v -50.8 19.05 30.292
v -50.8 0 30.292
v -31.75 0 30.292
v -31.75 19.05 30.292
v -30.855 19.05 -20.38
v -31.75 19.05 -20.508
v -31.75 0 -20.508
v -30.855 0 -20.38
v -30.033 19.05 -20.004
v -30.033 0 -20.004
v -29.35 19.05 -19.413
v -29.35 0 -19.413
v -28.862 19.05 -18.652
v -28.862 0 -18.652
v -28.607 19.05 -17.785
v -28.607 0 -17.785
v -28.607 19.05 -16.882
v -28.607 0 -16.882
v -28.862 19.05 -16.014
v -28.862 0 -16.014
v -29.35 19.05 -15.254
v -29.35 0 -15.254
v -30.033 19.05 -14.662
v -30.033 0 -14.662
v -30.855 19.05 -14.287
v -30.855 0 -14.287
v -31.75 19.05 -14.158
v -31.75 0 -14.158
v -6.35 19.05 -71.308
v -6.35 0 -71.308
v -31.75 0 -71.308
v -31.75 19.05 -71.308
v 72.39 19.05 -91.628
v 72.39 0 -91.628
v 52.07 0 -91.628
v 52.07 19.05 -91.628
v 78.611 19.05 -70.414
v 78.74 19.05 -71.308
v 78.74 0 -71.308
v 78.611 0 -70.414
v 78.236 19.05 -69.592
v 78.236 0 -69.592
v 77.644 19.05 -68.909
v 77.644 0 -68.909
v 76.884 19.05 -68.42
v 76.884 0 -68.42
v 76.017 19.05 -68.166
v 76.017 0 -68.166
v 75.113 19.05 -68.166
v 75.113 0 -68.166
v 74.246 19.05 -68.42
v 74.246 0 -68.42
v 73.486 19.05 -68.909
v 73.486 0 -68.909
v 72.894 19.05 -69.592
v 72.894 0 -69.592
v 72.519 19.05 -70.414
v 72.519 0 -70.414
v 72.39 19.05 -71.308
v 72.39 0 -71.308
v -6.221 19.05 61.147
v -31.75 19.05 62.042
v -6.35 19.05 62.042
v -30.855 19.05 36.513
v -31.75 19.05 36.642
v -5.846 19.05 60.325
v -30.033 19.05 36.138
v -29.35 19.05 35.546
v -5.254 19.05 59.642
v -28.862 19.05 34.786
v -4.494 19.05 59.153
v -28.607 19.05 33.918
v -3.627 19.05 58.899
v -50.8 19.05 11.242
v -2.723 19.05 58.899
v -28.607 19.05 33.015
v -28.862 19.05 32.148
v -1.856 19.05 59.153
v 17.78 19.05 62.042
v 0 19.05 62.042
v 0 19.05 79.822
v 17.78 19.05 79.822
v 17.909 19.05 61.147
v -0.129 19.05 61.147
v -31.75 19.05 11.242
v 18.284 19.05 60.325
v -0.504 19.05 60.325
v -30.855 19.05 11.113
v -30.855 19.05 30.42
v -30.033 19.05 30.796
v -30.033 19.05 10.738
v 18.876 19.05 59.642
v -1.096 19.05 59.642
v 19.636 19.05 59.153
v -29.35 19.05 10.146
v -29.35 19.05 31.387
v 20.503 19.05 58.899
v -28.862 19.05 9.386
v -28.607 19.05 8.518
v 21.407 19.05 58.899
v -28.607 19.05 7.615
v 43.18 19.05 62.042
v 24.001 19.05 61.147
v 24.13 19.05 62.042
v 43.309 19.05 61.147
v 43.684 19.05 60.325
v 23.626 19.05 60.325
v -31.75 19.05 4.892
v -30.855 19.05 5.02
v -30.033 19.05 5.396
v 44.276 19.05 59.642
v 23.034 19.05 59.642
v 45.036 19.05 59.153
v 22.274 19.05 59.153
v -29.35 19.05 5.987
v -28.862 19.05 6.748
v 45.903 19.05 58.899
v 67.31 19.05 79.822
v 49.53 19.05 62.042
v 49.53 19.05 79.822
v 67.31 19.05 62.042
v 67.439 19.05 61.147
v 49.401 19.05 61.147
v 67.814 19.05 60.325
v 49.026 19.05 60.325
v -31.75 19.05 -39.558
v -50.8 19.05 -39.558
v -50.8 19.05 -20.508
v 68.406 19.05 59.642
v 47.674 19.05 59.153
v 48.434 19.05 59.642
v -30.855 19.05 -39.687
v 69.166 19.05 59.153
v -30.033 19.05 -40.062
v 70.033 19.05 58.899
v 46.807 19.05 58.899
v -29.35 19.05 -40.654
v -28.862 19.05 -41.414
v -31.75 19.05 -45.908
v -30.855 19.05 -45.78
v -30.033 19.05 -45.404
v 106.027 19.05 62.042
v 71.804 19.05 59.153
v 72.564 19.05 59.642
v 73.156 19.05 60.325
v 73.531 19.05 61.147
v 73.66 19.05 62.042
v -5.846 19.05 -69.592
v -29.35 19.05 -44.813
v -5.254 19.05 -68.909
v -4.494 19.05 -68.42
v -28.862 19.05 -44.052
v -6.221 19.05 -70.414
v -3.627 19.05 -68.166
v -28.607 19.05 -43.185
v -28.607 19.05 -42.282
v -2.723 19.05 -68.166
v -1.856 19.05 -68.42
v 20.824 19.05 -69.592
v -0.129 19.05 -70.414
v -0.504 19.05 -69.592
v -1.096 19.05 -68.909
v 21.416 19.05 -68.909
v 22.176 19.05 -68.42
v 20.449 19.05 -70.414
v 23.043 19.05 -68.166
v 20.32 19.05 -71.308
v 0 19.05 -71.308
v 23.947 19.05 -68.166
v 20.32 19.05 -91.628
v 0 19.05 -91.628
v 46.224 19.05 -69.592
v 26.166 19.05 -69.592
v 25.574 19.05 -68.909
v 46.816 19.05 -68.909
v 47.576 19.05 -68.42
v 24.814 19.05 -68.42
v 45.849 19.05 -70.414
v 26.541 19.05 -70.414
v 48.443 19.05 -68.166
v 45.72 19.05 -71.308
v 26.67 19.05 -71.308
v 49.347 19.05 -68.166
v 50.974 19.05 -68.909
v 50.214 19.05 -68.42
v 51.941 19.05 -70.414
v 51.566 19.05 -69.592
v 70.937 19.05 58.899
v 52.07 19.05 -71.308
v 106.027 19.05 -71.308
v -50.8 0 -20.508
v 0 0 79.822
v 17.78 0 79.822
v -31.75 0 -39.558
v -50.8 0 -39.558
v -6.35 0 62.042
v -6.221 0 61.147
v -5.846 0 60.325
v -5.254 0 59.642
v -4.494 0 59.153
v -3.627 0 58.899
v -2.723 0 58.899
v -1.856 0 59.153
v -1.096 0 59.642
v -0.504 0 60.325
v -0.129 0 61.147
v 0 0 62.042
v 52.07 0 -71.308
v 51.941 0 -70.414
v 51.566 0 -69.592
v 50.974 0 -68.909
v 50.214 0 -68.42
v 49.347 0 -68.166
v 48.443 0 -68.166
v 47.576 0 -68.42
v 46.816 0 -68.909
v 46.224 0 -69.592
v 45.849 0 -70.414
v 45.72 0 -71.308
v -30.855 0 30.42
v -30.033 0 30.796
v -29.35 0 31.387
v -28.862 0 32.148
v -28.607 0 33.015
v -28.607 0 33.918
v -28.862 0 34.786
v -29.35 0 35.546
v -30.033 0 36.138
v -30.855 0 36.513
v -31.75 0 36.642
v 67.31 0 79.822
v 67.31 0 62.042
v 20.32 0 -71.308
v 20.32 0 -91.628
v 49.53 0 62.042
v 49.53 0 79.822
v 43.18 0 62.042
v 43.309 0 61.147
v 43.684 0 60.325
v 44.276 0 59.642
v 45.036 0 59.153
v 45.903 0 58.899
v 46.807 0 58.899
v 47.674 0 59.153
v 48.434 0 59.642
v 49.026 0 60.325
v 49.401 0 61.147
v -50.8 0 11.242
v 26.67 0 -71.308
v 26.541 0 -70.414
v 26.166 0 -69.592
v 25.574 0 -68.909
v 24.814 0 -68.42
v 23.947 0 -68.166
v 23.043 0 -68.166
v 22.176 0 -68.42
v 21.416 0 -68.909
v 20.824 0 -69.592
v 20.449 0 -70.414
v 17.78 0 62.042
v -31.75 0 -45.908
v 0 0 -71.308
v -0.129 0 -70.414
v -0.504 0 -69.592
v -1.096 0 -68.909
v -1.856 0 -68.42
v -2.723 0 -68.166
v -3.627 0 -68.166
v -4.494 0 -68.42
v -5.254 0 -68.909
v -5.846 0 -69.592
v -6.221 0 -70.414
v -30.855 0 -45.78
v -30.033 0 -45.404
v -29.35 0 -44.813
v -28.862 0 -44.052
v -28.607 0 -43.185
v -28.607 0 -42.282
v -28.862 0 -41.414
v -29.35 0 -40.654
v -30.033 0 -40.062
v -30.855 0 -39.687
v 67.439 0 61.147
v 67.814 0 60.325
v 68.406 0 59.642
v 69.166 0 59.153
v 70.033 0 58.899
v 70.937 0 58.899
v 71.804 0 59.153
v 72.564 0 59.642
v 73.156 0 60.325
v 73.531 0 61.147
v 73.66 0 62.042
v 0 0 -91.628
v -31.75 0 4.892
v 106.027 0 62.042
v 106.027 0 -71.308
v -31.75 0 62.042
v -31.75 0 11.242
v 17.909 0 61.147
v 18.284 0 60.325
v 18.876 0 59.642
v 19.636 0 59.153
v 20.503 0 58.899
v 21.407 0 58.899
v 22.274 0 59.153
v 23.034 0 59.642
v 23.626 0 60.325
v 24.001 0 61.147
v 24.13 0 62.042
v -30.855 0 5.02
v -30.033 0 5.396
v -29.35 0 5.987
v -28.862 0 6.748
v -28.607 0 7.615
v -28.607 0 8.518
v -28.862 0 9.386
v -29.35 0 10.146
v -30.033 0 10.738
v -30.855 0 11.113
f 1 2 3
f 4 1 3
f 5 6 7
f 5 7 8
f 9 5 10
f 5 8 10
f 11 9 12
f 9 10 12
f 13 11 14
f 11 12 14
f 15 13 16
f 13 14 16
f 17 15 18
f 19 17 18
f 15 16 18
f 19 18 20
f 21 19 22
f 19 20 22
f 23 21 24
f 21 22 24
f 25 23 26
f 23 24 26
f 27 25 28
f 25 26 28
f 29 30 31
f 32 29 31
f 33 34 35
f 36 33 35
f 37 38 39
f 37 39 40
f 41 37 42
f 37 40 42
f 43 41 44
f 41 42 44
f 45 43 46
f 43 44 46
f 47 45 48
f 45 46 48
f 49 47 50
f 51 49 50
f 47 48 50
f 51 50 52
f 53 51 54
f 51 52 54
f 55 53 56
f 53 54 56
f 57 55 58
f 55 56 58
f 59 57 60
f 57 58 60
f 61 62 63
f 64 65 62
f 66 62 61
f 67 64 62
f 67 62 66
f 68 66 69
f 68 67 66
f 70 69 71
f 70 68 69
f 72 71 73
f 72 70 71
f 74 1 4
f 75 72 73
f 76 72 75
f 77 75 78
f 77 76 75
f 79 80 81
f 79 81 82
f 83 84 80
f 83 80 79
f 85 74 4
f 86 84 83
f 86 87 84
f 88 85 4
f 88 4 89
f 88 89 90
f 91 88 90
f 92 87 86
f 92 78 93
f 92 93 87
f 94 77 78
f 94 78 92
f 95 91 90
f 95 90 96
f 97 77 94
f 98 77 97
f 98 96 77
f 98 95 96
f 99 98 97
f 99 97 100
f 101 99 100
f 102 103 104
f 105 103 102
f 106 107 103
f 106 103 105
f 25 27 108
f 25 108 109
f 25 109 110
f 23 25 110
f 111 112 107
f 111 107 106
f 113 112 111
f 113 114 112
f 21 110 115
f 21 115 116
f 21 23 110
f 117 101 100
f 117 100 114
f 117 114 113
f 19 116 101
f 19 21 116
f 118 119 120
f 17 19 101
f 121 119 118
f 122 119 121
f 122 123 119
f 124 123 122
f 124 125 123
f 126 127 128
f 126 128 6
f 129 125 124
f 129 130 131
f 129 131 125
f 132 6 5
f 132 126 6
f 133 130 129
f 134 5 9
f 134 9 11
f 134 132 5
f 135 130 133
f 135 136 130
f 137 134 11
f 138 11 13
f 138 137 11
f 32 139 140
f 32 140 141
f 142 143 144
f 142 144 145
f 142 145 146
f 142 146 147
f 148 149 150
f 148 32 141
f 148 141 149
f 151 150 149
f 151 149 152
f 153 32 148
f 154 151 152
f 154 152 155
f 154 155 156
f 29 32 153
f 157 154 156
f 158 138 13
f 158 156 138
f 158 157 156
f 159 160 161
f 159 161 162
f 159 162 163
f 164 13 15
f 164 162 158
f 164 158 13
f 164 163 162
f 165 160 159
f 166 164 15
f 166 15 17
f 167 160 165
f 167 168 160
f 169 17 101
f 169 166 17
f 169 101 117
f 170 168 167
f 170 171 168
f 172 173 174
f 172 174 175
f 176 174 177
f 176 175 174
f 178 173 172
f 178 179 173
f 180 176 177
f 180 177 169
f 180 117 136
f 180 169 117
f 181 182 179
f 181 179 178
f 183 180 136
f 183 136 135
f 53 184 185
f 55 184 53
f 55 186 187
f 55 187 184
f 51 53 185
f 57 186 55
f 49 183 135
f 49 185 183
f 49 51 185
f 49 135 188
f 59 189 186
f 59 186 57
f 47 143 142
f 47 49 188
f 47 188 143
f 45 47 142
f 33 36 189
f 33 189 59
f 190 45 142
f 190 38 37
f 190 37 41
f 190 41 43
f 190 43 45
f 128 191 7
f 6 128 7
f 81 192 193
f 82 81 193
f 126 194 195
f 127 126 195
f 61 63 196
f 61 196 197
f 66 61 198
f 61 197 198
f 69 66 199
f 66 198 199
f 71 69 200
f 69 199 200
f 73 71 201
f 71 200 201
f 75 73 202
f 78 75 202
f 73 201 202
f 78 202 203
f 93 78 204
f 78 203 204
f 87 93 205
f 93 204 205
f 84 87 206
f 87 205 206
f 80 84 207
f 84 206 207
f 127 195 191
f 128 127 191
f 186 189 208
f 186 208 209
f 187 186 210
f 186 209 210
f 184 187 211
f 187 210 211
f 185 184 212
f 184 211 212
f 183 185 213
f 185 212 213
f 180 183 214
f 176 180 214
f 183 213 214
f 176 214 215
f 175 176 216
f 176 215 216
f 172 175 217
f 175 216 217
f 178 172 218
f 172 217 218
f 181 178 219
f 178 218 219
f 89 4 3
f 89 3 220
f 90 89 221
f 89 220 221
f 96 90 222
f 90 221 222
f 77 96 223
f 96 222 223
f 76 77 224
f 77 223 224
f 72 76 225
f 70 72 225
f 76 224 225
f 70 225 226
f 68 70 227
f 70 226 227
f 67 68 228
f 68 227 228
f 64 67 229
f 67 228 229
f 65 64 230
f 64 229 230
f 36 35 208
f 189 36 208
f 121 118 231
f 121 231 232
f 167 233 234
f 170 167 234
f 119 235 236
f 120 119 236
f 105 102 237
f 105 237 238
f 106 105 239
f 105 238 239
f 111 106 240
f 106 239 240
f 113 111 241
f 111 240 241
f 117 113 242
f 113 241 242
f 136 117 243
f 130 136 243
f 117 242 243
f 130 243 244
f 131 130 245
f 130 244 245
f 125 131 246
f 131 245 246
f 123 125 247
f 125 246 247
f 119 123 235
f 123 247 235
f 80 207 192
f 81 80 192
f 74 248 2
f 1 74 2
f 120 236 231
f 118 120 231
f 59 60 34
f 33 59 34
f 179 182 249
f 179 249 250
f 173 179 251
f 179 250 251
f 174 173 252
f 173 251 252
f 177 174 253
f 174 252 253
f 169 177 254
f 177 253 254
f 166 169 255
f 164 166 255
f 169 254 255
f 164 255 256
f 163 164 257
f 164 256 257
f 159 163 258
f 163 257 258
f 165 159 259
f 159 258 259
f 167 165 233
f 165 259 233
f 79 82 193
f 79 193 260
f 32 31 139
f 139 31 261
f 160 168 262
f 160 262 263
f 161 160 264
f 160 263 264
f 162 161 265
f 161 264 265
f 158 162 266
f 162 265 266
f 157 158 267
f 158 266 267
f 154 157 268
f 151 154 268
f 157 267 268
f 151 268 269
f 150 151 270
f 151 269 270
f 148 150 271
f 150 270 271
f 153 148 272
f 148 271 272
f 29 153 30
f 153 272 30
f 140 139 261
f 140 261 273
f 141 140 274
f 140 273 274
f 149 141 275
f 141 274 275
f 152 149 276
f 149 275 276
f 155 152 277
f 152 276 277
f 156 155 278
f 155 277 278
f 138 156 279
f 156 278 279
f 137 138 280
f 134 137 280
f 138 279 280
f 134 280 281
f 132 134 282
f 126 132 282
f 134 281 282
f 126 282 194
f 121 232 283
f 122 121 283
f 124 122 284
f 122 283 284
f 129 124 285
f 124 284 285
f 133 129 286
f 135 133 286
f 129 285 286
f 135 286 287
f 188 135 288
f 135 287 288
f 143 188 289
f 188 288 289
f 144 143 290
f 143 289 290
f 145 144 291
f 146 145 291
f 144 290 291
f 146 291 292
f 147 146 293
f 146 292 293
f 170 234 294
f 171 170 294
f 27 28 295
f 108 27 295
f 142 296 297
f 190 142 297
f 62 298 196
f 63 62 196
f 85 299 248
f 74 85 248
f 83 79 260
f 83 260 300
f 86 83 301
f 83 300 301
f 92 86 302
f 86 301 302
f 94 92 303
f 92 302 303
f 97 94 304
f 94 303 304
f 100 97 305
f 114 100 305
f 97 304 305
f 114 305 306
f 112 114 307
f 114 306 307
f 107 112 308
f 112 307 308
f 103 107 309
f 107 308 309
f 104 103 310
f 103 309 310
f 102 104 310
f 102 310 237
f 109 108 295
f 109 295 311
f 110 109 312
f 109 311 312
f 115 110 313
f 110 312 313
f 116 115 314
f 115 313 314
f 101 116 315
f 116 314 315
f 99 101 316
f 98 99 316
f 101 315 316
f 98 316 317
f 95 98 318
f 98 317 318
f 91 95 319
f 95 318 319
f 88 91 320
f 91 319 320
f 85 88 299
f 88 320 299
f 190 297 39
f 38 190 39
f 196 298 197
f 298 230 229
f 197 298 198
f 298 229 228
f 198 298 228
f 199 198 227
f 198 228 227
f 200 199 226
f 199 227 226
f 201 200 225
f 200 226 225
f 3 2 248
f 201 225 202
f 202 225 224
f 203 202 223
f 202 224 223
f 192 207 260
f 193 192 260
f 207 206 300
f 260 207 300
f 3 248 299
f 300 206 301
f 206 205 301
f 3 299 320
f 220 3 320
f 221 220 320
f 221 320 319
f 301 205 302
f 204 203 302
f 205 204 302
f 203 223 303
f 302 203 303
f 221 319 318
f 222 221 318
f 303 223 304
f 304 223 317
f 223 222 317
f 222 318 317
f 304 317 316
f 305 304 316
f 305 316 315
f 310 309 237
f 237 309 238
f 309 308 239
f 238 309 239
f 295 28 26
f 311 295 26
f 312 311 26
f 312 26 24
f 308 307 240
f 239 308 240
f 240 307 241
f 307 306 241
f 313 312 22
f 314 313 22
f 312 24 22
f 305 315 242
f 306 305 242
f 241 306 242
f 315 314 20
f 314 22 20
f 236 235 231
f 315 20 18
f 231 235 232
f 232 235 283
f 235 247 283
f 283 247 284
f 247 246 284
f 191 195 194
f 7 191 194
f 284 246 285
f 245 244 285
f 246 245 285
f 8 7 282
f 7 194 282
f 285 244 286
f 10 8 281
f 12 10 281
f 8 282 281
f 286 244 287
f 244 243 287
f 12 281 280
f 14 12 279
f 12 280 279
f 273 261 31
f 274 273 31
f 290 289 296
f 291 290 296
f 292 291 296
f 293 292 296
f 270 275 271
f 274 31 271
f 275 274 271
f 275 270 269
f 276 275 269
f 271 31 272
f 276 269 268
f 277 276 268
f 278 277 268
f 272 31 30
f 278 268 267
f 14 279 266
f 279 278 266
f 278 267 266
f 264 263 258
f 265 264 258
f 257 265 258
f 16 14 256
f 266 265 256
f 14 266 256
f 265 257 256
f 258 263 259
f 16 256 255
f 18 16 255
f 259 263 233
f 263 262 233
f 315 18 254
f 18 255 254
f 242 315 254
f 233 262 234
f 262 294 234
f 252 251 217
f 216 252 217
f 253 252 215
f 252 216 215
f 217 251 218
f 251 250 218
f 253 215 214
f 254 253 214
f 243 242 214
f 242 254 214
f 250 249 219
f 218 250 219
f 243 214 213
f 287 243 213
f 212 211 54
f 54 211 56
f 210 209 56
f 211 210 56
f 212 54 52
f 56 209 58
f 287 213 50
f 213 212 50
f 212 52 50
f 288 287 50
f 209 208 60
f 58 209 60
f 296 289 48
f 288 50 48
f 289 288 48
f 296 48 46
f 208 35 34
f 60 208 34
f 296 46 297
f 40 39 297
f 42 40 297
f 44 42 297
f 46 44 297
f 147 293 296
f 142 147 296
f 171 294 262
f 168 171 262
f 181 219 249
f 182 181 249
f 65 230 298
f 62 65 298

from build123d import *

# Parameters (mm, degrees)
BOSS_EXTRUDE1_DEPTH = 19.05


with BuildPart() as part:
    # Sketch1 → Boss-Extrude1 (new body)
    with BuildSketch(Plane(origin=(0, 0, 0), x_dir=(1, 0, 0), z_dir=(0, 1, 0))):
        with BuildLine():
            Line((-31.75, 39.558423237), (-50.8, 39.558423237))
            Line((-50.8, 39.558423237), (-50.8, 20.508423237))
            Line((-50.8, 20.508423237), (-31.75, 20.508423237))
            ThreePointArc((-31.75, 20.508423237), (-28.575, 17.333423237), (-31.75, 14.158423237))
            Line((-31.75, 14.158423237), (-31.75, -4.891576763))
            ThreePointArc((-31.75, -4.891576763), (-28.575, -8.066576763), (-31.75, -11.241576763))
            Line((-31.75, -11.241576763), (-50.8, -11.241576763))
            Line((-50.8, -11.241576763), (-50.8, -30.291576763))
            Line((-50.8, -30.291576763), (-31.75, -30.291576763))
            ThreePointArc((-31.75, -30.291576763), (-28.575, -33.466576763), (-31.75, -36.641576763))
            Line((-31.75, -36.641576763), (-31.75, -62.041576763))
            Line((-31.75, -62.041576763), (-6.35, -62.041576763))
            ThreePointArc((-6.35, -62.041576763), (-3.175, -58.866576763), (0, -62.041576763))
            Line((0, -62.041576763), (0, -79.821576763))
            Line((0, -79.821576763), (17.78, -79.821576763))
            Line((17.78, -79.821576763), (17.78, -62.041576763))
            ThreePointArc((17.78, -62.041576763), (20.955, -58.866576763), (24.13, -62.041576763))
            Line((24.13, -62.041576763), (43.18, -62.041576763))
            ThreePointArc((43.18, -62.041576763), (46.355, -58.866576763), (49.53, -62.041576763))
            Line((49.53, -62.041576763), (49.53, -79.821576763))
            Line((49.53, -79.821576763), (67.31, -79.821576763))
            Line((67.31, -79.821576763), (67.31, -62.041576763))
            ThreePointArc((67.31, -62.041576763), (70.485, -58.866576763), (73.66, -62.041576763))
            Line((73.66, -62.041576763), (106.027076755, -62.041576763))
            Line((106.027076755, -62.041576763), (106.027076755, 71.308423237))
            Line((106.027076755, 71.308423237), (78.74, 71.308423237))
            ThreePointArc((78.74, 71.308423237), (75.565, 68.133423237), (72.39, 71.308423237))
            Line((72.39, 71.308423237), (72.39, 91.628423237))
            Line((72.39, 91.628423237), (52.07, 91.628423237))
            Line((52.07, 91.628423237), (52.07, 71.308423237))
            ThreePointArc((52.07, 71.308423237), (48.895, 68.133423237), (45.72, 71.308423237))
            Line((45.72, 71.308423237), (26.67, 71.308423237))
            ThreePointArc((26.67, 71.308423237), (23.495, 68.133423237), (20.32, 71.308423237))
            Line((20.32, 71.308423237), (20.32, 91.628423237))
            Line((20.32, 91.628423237), (0, 91.628423237))
            Line((0, 91.628423237), (0, 71.308423237))
            ThreePointArc((0, 71.308423237), (-3.175, 68.133423237), (-6.35, 71.308423237))
            Line((-6.35, 71.308423237), (-31.75, 71.308423237))
            Line((-31.75, 71.308423237), (-31.75, 45.908423237))
            ThreePointArc((-31.75, 45.908423237), (-28.575, 42.733423237), (-31.75, 39.558423237))
        make_face()
    extrude(amount=BOSS_EXTRUDE1_DEPTH)


solid = part.part
